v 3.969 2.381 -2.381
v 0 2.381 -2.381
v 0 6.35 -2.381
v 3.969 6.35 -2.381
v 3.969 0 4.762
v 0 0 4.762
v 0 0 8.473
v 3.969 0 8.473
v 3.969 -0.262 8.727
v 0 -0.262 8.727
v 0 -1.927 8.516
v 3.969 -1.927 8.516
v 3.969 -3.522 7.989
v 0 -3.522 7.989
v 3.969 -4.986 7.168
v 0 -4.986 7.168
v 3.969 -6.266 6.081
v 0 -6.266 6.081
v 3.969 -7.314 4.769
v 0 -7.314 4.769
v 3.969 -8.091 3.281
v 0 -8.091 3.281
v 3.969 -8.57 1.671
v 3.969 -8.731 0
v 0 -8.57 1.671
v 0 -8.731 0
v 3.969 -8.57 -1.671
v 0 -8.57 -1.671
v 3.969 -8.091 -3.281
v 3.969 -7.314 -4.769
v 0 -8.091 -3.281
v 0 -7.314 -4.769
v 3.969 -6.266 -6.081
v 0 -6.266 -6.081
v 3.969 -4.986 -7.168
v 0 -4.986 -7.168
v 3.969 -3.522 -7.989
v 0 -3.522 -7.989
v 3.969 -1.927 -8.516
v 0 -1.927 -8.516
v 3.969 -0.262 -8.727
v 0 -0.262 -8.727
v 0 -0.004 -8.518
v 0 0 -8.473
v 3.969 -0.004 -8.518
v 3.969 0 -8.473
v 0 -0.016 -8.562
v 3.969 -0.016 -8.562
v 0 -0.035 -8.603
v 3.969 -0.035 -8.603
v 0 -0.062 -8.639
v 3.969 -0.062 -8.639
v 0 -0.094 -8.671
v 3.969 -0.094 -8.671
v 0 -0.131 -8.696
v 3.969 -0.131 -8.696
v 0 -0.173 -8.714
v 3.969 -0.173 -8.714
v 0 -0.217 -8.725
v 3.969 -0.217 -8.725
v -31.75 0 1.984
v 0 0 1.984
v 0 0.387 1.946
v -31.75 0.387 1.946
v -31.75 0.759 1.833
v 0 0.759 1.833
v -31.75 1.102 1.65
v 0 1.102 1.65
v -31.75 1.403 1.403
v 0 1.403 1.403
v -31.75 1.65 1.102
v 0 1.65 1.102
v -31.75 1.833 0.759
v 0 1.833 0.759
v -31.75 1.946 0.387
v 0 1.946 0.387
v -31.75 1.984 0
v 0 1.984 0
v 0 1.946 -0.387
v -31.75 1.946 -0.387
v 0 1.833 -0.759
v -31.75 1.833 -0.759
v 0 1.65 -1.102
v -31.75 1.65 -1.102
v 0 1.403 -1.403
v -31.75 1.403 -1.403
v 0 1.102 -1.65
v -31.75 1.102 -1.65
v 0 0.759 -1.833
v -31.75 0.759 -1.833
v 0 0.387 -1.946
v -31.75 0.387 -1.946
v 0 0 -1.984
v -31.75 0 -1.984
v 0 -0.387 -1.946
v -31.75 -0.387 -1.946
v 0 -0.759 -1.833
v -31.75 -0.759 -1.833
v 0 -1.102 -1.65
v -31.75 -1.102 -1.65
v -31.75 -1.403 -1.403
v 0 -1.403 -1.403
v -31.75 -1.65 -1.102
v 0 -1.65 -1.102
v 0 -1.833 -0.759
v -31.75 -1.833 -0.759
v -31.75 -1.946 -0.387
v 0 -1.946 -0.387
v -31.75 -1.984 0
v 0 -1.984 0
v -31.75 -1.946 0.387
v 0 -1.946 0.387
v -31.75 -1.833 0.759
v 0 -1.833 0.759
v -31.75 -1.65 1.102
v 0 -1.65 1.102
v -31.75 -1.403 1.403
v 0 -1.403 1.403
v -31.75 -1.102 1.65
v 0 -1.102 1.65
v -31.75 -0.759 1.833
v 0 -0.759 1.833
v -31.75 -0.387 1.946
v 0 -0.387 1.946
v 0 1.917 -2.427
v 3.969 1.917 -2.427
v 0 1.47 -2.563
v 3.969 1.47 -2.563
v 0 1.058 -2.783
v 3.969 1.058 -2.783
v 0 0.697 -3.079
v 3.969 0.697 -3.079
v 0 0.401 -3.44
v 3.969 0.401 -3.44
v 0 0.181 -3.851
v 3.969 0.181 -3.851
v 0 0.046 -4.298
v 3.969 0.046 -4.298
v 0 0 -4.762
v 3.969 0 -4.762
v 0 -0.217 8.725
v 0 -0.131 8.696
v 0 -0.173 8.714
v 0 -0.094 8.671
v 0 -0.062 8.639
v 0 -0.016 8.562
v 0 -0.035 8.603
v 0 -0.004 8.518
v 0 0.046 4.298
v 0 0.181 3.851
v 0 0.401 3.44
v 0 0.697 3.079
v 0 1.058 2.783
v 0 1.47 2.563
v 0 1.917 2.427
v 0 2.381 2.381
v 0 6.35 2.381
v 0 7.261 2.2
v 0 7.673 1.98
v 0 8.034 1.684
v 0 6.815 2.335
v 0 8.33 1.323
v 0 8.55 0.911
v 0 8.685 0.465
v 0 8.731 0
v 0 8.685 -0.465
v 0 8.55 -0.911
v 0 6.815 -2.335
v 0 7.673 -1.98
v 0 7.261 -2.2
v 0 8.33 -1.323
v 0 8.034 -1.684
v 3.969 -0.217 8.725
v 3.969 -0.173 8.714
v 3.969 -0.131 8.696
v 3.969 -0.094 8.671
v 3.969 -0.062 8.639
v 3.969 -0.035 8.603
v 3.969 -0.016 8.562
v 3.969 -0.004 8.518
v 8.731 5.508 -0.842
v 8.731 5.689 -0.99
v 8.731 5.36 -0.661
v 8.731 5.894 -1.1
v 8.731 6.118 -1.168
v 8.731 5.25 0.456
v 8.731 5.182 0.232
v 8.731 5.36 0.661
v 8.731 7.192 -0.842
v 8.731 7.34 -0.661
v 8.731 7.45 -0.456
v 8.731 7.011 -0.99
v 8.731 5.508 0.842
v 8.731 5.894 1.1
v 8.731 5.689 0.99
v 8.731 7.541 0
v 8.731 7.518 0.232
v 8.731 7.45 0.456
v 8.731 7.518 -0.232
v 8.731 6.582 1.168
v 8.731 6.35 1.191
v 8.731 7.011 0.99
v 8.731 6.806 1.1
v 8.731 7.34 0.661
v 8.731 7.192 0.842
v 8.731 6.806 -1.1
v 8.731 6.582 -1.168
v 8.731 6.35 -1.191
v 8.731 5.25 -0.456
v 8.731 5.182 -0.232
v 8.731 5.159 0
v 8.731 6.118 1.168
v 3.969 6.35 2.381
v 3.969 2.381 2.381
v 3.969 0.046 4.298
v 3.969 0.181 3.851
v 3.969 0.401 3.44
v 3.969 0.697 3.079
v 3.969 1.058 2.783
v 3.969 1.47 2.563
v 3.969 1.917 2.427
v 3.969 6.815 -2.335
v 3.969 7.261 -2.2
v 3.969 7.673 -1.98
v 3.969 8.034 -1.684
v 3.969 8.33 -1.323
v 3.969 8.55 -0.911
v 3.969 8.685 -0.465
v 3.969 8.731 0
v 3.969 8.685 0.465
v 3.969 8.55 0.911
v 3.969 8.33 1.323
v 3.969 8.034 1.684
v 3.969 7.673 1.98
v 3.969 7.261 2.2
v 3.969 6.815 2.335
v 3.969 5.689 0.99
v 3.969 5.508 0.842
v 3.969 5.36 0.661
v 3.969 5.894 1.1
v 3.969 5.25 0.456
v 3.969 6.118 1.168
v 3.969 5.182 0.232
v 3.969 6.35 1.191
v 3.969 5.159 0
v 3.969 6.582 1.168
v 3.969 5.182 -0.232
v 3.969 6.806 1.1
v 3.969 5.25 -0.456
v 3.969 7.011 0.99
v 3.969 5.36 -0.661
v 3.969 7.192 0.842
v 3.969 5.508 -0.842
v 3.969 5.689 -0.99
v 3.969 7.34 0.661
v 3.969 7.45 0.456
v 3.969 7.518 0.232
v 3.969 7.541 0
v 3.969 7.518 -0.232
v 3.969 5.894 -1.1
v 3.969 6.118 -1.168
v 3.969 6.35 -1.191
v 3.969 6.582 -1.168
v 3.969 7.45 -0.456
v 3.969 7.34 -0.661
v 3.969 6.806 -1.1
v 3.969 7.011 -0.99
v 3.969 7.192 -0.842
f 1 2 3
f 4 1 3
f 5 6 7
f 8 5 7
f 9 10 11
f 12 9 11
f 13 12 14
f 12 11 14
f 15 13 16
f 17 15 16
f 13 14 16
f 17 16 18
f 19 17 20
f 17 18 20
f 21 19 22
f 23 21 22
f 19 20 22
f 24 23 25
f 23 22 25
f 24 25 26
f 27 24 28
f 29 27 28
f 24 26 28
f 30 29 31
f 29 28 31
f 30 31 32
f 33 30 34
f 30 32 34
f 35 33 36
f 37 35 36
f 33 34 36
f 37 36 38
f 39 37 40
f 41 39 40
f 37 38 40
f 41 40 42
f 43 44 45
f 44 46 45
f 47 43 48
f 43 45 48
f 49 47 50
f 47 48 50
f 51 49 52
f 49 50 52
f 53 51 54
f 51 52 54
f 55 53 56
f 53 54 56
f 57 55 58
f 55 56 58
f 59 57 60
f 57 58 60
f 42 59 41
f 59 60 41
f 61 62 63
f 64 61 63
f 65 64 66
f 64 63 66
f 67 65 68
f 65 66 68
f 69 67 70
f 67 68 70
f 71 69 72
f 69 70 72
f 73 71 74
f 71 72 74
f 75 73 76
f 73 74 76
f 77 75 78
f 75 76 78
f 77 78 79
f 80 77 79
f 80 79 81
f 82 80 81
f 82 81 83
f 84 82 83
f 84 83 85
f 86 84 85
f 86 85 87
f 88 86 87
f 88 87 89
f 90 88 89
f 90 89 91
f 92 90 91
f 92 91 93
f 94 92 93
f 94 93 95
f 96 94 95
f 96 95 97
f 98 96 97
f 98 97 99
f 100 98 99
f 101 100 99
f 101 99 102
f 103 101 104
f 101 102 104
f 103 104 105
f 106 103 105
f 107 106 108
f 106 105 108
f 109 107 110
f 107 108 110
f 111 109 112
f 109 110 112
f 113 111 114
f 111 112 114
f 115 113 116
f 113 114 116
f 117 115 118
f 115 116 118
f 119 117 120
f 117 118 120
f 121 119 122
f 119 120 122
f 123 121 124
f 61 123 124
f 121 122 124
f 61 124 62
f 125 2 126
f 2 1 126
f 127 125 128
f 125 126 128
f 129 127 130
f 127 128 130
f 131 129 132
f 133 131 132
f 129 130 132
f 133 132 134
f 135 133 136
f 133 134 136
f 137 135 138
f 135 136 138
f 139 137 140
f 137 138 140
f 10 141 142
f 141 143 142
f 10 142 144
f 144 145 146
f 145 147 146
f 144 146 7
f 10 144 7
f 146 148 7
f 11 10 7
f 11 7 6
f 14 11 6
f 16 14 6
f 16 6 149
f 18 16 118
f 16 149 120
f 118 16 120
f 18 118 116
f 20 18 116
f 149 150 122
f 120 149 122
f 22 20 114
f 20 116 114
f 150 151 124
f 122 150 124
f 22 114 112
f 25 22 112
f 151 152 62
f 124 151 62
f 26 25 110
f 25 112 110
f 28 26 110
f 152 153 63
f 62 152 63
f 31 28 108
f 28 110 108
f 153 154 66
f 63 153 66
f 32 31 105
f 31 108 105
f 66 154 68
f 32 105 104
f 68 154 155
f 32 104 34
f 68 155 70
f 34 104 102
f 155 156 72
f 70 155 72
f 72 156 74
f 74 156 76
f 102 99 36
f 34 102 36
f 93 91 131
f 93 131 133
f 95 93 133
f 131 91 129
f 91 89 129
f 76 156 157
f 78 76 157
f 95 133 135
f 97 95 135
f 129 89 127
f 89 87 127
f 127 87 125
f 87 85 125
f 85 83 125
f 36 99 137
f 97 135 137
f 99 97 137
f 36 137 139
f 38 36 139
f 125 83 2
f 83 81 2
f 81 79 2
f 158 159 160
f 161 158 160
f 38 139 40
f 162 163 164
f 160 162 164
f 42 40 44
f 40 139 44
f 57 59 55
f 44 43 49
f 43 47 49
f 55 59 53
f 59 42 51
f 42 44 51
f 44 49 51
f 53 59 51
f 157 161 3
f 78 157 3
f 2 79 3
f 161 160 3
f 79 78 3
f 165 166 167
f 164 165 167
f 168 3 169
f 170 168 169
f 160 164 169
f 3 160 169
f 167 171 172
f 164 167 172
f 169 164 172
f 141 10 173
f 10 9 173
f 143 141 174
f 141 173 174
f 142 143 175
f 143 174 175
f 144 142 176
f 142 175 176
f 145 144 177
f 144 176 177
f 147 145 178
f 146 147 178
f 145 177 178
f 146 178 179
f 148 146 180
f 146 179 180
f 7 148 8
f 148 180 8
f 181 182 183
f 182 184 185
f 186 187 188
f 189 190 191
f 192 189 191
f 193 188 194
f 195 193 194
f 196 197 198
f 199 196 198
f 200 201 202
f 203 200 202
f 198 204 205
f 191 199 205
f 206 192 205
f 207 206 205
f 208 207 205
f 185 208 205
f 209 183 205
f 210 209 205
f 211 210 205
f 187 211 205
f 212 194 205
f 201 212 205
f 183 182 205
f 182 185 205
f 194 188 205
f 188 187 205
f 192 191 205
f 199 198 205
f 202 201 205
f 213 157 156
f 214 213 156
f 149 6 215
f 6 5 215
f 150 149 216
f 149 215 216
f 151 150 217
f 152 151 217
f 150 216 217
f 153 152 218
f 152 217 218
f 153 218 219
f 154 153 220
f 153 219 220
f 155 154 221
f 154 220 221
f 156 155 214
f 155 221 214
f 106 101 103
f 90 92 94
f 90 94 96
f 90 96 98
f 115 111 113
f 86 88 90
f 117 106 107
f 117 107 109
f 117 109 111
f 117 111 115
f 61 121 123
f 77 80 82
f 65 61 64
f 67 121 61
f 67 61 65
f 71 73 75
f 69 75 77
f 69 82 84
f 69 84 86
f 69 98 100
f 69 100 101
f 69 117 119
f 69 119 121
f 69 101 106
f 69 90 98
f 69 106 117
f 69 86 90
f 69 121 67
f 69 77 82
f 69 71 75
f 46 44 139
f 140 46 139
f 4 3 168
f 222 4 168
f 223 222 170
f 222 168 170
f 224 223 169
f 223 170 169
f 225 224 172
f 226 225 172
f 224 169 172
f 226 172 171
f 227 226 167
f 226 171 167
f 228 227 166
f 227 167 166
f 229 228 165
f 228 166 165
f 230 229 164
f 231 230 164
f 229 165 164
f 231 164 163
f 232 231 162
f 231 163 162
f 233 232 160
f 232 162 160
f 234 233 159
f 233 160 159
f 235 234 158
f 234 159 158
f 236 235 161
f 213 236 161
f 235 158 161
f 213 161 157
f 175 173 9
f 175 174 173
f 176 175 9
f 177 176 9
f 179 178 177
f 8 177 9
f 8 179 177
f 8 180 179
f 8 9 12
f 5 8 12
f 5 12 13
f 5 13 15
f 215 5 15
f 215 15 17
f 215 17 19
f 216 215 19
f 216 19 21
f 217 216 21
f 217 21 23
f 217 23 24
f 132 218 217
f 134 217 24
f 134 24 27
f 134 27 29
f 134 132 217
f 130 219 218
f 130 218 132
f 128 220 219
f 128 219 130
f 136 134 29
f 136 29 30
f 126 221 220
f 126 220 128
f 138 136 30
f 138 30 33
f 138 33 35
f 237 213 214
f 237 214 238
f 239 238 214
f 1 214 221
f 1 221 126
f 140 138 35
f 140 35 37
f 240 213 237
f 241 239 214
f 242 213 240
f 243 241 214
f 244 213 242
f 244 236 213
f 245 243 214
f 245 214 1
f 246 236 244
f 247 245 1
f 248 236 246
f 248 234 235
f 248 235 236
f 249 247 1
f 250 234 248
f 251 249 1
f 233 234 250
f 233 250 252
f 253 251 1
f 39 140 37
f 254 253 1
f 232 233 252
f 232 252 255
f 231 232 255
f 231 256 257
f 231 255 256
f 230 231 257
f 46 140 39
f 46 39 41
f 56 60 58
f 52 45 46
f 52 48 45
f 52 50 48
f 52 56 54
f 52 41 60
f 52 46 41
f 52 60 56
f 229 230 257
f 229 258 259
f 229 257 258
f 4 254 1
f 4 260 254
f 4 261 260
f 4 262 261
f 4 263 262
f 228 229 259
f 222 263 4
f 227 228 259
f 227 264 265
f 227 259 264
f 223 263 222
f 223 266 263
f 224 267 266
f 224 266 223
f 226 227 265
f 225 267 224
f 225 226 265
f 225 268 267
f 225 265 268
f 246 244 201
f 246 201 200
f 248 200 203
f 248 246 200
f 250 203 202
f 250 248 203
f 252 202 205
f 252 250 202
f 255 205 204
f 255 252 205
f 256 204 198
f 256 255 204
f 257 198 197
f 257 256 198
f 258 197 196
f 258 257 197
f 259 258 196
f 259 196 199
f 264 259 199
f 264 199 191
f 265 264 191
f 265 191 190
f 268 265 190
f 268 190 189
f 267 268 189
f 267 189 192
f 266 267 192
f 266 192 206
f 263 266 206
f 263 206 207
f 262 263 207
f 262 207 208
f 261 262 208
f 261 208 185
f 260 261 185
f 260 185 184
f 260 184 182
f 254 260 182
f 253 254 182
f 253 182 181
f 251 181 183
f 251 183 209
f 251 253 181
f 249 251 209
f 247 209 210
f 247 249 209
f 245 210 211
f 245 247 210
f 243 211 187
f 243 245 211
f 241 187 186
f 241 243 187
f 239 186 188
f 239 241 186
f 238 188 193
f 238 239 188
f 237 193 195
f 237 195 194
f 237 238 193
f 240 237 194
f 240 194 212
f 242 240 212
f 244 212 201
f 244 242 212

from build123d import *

# Parameters (mm, degrees)
SKETCH2_R           = 1.190625
SKETCH2_R_2         = 1.984375
BOSS_EXTRUDE1_DEPTH = 3.96875
SKETCH3_R           = 1.190625
BOSS_EXTRUDE2_DEPTH = 8.73125
SKETCH4_R           = 1.984375
BOSS_EXTRUDE3_DEPTH = 31.75
SKETCH5_R           = 1.984375
BOSS_EXTRUDE4_DEPTH = 3.96875
FILLET2_R           = 2.38125
FILLET3_R           = 0.254


with BuildPart() as part:
    # Sketch2 → Boss-Extrude1 (new body)
    with BuildSketch(Plane(origin=(0, 0, 0), x_dir=(0, 0, -1), z_dir=(1, 0, 0))):
        with BuildLine():
            Line((8.73125, 0), (2.38125, 0))
            Line((2.38125, 0), (2.38125, 6.35))
            ThreePointArc((2.38125, 6.35), (0, 8.73125), (-2.38125, 6.35))
            Line((-2.38125, 6.35), (-2.38125, 0))
            Line((-2.38125, 0), (-8.73125, 0))
            ThreePointArc((-8.73125, 0), (0, -8.73125), (8.73125, 0))
        make_face()
        with Locations((0, 6.35)):
            Circle(SKETCH2_R, mode=Mode.SUBTRACT)
        Circle(SKETCH2_R_2, mode=Mode.SUBTRACT)
    extrude(amount=BOSS_EXTRUDE1_DEPTH)

    # Sketch3 → Boss-Extrude2 (add)
    with BuildSketch(Plane.ZY):
        with Locations((0, 6.35)):
            Circle(SKETCH3_R)
    extrude(amount=-BOSS_EXTRUDE2_DEPTH)



with BuildPart() as body_2:
    # Sketch4 → Boss-Extrude3 (new body)
    with BuildSketch(Plane.ZY):
        Circle(SKETCH4_R)
    extrude(amount=BOSS_EXTRUDE3_DEPTH)


with BuildPart() as part_1:
    add(part.part)

    add(body_2.part)  # Boss-Extrude4 merges body 2
    # Sketch5 → Boss-Extrude4 (add)
    with BuildSketch(Plane(origin=(0, 0, 0), x_dir=(0, 0, -1), z_dir=(1, 0, 0))):
        Circle(SKETCH5_R)
    extrude(amount=BOSS_EXTRUDE4_DEPTH)

    # Fillet2
    fillet2_edges = [part_1.edges().sort_by_distance(p)[0] for p in [
        (1.984375, 0, -2.38125),
        (1.984375, 0, 2.38125),
    ]]
    fillet(fillet2_edges, radius=FILLET2_R)

    # Fillet3
    fillet3_edges = [part_1.edges().sort_by_distance(p)[0] for p in [
        (1.984375, 0, -8.73125),
        (1.984375, 0, 8.73125),
    ]]
    fillet(fillet3_edges, radius=FILLET3_R)


solid = part_1.part
